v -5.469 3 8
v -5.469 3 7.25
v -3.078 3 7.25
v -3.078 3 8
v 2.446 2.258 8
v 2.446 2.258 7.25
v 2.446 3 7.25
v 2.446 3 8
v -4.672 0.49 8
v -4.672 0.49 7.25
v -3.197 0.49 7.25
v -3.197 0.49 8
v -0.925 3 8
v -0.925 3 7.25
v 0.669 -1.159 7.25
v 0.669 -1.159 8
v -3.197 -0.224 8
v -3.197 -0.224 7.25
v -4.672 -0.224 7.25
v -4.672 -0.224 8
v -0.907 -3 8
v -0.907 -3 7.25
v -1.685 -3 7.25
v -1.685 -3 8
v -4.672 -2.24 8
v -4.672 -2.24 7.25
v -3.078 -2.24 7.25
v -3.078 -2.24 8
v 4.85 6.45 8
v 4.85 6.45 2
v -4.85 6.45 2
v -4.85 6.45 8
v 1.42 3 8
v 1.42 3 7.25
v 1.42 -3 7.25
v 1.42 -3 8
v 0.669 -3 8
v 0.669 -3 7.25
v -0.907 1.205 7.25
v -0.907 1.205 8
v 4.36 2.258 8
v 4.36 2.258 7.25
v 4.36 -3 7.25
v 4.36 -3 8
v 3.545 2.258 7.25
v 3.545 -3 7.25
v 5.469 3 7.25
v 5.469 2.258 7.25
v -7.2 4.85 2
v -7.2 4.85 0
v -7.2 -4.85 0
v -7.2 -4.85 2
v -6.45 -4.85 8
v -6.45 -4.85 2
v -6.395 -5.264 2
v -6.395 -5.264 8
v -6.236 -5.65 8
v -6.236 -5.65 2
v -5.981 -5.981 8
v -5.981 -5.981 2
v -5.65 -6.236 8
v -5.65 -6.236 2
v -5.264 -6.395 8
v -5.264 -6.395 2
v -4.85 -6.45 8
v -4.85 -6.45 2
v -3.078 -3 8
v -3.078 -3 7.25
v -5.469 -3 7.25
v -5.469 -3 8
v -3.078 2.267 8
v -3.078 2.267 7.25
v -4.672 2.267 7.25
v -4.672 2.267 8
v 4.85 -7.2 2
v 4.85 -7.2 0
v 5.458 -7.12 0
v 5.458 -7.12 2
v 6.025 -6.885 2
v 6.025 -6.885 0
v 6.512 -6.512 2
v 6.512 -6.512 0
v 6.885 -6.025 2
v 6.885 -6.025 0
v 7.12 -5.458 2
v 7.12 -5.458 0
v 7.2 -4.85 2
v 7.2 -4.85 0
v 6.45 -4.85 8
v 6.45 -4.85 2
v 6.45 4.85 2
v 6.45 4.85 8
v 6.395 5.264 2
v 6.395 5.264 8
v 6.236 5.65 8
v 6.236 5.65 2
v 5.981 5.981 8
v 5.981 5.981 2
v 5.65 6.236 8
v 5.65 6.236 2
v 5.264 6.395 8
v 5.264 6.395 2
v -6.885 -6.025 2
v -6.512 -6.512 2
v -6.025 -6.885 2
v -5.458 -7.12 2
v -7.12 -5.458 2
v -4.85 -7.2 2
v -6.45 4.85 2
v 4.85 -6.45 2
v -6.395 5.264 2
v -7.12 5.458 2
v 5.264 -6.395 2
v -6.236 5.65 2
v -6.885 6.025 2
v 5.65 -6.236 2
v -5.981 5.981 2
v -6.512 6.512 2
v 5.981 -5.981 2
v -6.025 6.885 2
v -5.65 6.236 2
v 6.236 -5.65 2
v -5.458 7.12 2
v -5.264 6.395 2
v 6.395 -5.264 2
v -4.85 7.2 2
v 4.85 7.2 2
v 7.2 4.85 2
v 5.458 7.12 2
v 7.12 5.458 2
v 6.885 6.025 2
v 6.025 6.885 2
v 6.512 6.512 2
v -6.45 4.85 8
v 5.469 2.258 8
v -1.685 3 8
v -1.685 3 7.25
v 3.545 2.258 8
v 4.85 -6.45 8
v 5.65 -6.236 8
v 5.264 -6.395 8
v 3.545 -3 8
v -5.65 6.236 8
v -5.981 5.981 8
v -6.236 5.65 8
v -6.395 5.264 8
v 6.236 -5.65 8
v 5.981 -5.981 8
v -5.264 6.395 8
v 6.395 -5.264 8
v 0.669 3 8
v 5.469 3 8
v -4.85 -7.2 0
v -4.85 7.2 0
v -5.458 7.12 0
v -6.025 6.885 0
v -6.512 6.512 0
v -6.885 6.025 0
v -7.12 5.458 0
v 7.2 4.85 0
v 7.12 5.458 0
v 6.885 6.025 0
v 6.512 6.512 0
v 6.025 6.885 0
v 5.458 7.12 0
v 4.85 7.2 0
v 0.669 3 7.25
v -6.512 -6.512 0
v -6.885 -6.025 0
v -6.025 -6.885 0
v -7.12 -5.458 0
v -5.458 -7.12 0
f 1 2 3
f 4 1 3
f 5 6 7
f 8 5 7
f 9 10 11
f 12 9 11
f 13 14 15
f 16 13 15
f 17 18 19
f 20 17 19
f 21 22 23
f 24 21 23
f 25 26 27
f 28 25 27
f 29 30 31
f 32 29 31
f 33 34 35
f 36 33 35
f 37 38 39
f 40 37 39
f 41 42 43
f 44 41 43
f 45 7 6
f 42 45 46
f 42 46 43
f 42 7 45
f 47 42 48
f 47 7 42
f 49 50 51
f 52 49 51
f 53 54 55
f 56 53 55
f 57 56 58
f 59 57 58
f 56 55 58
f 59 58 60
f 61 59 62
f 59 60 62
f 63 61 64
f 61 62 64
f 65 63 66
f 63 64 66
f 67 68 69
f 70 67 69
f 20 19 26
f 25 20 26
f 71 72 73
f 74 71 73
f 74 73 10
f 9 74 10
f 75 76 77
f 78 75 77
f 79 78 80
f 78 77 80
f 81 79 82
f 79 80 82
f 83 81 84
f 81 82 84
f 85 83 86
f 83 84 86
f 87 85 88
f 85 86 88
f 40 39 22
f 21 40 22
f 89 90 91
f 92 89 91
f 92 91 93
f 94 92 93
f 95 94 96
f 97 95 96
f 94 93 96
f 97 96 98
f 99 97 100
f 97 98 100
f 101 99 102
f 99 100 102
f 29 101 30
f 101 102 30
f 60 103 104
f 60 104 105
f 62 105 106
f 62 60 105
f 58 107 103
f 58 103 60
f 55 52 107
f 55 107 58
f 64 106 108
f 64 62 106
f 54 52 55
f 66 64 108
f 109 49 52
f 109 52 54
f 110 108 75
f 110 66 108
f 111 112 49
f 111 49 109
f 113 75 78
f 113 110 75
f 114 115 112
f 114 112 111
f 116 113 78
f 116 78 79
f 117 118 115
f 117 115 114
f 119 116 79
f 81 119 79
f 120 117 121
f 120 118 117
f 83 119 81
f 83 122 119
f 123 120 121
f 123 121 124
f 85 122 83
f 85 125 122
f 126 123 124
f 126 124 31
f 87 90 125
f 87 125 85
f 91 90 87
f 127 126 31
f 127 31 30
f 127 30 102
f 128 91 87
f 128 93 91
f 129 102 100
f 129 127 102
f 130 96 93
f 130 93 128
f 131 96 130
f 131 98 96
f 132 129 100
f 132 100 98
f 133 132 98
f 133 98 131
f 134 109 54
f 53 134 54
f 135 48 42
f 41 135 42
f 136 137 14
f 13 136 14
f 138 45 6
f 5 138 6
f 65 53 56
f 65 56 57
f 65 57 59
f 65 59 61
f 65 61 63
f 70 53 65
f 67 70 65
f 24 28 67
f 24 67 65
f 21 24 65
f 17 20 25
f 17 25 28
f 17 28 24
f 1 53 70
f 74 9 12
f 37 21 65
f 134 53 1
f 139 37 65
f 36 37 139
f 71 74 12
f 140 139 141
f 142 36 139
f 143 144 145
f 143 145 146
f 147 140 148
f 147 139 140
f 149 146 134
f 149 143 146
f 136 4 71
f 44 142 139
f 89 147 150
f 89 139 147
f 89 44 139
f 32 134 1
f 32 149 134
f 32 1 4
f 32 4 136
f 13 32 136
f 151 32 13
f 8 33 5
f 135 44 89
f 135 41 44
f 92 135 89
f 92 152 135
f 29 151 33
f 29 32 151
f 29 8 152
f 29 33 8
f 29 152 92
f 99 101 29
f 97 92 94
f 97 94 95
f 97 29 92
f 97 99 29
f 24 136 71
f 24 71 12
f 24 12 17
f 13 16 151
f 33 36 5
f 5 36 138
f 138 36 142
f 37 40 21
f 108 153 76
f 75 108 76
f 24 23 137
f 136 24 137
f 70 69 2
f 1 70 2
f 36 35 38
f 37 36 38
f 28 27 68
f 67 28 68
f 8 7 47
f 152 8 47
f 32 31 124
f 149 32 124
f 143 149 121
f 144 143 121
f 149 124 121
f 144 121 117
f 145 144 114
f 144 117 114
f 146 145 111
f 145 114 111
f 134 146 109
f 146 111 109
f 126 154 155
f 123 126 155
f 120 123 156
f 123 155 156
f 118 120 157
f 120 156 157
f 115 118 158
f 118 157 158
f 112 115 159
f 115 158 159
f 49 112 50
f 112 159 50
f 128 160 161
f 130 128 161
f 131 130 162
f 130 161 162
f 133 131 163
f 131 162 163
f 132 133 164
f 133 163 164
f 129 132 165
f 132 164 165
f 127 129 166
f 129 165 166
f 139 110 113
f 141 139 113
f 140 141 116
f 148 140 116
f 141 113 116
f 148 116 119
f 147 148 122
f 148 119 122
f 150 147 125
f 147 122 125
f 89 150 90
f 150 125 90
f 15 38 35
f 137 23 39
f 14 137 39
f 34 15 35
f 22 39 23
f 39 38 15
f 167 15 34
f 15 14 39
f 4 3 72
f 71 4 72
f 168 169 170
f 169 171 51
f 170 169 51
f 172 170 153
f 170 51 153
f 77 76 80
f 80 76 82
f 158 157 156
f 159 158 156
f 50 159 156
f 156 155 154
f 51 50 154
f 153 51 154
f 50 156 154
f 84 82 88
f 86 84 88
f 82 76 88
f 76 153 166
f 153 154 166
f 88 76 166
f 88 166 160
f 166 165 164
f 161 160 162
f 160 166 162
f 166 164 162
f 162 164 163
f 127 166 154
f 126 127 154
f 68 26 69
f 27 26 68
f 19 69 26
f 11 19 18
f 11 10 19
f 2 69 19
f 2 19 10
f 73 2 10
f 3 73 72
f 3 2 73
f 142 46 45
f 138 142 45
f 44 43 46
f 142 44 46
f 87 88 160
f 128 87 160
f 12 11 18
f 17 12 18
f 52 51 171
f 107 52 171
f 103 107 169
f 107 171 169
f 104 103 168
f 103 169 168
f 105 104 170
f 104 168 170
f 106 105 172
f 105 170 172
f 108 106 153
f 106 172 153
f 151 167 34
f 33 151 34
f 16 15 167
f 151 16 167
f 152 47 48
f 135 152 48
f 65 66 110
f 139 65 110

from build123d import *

# Parameters (mm, degrees)
F1_DEPTH = 2
F2_DEPTH = 8
F3_DEPTH = 7.25


with BuildPart() as f1:
    # F0 (on Top) → F1 (new body)
    with BuildSketch(Plane.XY):
        with BuildLine():
            Line((4.85, 7.2), (-4.85, 7.2))
            ThreePointArc((-4.85, 7.2), (-6.511701, 6.511701), (-7.2, 4.85))
            Line((-7.2, 4.85), (-7.2, -4.85))
            ThreePointArc((-7.2, -4.85), (-6.511701, -6.511701), (-4.85, -7.2))
            Line((-4.85, -7.2), (4.85, -7.2))
            ThreePointArc((4.85, -7.2), (6.511701, -6.511701), (7.2, -4.85))
            Line((7.2, -4.85), (7.2, 4.85))
            ThreePointArc((7.2, 4.85), (6.511701, 6.511701), (4.85, 7.2))
        make_face()
        with BuildLine():
            ThreePointArc((6.45, -4.85), (5.981371, -5.981371), (4.85, -6.45))
            Line((4.85, -6.45), (-4.85, -6.45))
            ThreePointArc((-4.85, -6.45), (-5.981371, -5.981371), (-6.45, -4.85))
            Line((-6.45, -4.85), (-6.45, 4.85))
            ThreePointArc((-6.45, 4.85), (-5.981371, 5.981371), (-4.85, 6.45))
            Line((-4.85, 6.45), (4.85, 6.45))
            ThreePointArc((4.85, 6.45), (5.981371, 5.981371), (6.45, 4.85))
            Line((6.45, 4.85), (6.45, -4.85))
        make_face(mode=Mode.SUBTRACT)
    extrude(amount=F1_DEPTH)

    # F0 (on Top) → F2 (join)
    with BuildSketch(Plane.XY):
        with BuildLine():
            Line((-4.85, -6.45), (4.85, -6.45))
            ThreePointArc((4.85, -6.45), (5.981371, -5.981371), (6.45, -4.85))
            Line((6.45, -4.85), (6.45, 4.85))
            ThreePointArc((6.45, 4.85), (5.981371, 5.981371), (4.85, 6.45))
            Line((4.85, 6.45), (-4.85, 6.45))
            ThreePointArc((-4.85, 6.45), (-5.981371, 5.981371), (-6.45, 4.85))
            Line((-6.45, 4.85), (-6.45, -4.85))
            ThreePointArc((-6.45, -4.85), (-5.981371, -5.981371), (-4.85, -6.45))
        make_face()
        Polygon((-3.077863, -3), (-5.468703, -3), (-5.468703, 3), (-3.077863, 3), (-3.077863, 2.267176), (-4.671756, 2.267176), (-4.671756, 0.490077), (-3.196947, 0.490077), (-3.196947, -0.224427), (-4.671756, -0.224427), (-4.671756, -2.239694), (-3.077863, -2.239694), align=None, mode=Mode.SUBTRACT)
        Polygon((-0.906871, -3), (-1.685497, -3), (-1.685497, 3), (-0.925191, 3), (0.668702, -1.158778), (0.668702, 3), (1.419847, 3), (1.419847, -3), (0.668702, -3), (-0.906871, 1.204581), align=None, mode=Mode.SUBTRACT)
        Polygon((4.360305, -3), (3.545038, -3), (3.545038, 2.258016), (2.445801, 2.258016), (2.445801, 3), (5.468702, 3), (5.468702, 2.258016), (4.360305, 2.258016), align=None, mode=Mode.SUBTRACT)
    extrude(amount=F2_DEPTH)

    # F0 (on Top) → F3 (join)
    with BuildSketch(Plane.XY):
        Polygon((-5.468703, 3), (-5.468703, -3), (-3.077863, -3), (-3.077863, -2.239694), (-4.671756, -2.239694), (-4.671756, -0.224427), (-3.196947, -0.224427), (-3.196947, 0.490077), (-4.671756, 0.490077), (-4.671756, 2.267176), (-3.077863, 2.267176), (-3.077863, 3), align=None)
        Polygon((-1.685497, 3), (-1.685497, -3), (-0.906871, -3), (-0.906871, 1.204581), (0.668702, -3), (1.419847, -3), (1.419847, 3), (0.668702, 3), (0.668702, -1.158778), (-0.925191, 3), align=None)
        Polygon((3.545038, 2.258016), (3.545038, -3), (4.360305, -3), (4.360305, 2.258016), (5.468702, 2.258016), (5.468702, 3), (2.445801, 3), (2.445801, 2.258016), align=None)
    extrude(amount=F3_DEPTH)


solid = f1.part
